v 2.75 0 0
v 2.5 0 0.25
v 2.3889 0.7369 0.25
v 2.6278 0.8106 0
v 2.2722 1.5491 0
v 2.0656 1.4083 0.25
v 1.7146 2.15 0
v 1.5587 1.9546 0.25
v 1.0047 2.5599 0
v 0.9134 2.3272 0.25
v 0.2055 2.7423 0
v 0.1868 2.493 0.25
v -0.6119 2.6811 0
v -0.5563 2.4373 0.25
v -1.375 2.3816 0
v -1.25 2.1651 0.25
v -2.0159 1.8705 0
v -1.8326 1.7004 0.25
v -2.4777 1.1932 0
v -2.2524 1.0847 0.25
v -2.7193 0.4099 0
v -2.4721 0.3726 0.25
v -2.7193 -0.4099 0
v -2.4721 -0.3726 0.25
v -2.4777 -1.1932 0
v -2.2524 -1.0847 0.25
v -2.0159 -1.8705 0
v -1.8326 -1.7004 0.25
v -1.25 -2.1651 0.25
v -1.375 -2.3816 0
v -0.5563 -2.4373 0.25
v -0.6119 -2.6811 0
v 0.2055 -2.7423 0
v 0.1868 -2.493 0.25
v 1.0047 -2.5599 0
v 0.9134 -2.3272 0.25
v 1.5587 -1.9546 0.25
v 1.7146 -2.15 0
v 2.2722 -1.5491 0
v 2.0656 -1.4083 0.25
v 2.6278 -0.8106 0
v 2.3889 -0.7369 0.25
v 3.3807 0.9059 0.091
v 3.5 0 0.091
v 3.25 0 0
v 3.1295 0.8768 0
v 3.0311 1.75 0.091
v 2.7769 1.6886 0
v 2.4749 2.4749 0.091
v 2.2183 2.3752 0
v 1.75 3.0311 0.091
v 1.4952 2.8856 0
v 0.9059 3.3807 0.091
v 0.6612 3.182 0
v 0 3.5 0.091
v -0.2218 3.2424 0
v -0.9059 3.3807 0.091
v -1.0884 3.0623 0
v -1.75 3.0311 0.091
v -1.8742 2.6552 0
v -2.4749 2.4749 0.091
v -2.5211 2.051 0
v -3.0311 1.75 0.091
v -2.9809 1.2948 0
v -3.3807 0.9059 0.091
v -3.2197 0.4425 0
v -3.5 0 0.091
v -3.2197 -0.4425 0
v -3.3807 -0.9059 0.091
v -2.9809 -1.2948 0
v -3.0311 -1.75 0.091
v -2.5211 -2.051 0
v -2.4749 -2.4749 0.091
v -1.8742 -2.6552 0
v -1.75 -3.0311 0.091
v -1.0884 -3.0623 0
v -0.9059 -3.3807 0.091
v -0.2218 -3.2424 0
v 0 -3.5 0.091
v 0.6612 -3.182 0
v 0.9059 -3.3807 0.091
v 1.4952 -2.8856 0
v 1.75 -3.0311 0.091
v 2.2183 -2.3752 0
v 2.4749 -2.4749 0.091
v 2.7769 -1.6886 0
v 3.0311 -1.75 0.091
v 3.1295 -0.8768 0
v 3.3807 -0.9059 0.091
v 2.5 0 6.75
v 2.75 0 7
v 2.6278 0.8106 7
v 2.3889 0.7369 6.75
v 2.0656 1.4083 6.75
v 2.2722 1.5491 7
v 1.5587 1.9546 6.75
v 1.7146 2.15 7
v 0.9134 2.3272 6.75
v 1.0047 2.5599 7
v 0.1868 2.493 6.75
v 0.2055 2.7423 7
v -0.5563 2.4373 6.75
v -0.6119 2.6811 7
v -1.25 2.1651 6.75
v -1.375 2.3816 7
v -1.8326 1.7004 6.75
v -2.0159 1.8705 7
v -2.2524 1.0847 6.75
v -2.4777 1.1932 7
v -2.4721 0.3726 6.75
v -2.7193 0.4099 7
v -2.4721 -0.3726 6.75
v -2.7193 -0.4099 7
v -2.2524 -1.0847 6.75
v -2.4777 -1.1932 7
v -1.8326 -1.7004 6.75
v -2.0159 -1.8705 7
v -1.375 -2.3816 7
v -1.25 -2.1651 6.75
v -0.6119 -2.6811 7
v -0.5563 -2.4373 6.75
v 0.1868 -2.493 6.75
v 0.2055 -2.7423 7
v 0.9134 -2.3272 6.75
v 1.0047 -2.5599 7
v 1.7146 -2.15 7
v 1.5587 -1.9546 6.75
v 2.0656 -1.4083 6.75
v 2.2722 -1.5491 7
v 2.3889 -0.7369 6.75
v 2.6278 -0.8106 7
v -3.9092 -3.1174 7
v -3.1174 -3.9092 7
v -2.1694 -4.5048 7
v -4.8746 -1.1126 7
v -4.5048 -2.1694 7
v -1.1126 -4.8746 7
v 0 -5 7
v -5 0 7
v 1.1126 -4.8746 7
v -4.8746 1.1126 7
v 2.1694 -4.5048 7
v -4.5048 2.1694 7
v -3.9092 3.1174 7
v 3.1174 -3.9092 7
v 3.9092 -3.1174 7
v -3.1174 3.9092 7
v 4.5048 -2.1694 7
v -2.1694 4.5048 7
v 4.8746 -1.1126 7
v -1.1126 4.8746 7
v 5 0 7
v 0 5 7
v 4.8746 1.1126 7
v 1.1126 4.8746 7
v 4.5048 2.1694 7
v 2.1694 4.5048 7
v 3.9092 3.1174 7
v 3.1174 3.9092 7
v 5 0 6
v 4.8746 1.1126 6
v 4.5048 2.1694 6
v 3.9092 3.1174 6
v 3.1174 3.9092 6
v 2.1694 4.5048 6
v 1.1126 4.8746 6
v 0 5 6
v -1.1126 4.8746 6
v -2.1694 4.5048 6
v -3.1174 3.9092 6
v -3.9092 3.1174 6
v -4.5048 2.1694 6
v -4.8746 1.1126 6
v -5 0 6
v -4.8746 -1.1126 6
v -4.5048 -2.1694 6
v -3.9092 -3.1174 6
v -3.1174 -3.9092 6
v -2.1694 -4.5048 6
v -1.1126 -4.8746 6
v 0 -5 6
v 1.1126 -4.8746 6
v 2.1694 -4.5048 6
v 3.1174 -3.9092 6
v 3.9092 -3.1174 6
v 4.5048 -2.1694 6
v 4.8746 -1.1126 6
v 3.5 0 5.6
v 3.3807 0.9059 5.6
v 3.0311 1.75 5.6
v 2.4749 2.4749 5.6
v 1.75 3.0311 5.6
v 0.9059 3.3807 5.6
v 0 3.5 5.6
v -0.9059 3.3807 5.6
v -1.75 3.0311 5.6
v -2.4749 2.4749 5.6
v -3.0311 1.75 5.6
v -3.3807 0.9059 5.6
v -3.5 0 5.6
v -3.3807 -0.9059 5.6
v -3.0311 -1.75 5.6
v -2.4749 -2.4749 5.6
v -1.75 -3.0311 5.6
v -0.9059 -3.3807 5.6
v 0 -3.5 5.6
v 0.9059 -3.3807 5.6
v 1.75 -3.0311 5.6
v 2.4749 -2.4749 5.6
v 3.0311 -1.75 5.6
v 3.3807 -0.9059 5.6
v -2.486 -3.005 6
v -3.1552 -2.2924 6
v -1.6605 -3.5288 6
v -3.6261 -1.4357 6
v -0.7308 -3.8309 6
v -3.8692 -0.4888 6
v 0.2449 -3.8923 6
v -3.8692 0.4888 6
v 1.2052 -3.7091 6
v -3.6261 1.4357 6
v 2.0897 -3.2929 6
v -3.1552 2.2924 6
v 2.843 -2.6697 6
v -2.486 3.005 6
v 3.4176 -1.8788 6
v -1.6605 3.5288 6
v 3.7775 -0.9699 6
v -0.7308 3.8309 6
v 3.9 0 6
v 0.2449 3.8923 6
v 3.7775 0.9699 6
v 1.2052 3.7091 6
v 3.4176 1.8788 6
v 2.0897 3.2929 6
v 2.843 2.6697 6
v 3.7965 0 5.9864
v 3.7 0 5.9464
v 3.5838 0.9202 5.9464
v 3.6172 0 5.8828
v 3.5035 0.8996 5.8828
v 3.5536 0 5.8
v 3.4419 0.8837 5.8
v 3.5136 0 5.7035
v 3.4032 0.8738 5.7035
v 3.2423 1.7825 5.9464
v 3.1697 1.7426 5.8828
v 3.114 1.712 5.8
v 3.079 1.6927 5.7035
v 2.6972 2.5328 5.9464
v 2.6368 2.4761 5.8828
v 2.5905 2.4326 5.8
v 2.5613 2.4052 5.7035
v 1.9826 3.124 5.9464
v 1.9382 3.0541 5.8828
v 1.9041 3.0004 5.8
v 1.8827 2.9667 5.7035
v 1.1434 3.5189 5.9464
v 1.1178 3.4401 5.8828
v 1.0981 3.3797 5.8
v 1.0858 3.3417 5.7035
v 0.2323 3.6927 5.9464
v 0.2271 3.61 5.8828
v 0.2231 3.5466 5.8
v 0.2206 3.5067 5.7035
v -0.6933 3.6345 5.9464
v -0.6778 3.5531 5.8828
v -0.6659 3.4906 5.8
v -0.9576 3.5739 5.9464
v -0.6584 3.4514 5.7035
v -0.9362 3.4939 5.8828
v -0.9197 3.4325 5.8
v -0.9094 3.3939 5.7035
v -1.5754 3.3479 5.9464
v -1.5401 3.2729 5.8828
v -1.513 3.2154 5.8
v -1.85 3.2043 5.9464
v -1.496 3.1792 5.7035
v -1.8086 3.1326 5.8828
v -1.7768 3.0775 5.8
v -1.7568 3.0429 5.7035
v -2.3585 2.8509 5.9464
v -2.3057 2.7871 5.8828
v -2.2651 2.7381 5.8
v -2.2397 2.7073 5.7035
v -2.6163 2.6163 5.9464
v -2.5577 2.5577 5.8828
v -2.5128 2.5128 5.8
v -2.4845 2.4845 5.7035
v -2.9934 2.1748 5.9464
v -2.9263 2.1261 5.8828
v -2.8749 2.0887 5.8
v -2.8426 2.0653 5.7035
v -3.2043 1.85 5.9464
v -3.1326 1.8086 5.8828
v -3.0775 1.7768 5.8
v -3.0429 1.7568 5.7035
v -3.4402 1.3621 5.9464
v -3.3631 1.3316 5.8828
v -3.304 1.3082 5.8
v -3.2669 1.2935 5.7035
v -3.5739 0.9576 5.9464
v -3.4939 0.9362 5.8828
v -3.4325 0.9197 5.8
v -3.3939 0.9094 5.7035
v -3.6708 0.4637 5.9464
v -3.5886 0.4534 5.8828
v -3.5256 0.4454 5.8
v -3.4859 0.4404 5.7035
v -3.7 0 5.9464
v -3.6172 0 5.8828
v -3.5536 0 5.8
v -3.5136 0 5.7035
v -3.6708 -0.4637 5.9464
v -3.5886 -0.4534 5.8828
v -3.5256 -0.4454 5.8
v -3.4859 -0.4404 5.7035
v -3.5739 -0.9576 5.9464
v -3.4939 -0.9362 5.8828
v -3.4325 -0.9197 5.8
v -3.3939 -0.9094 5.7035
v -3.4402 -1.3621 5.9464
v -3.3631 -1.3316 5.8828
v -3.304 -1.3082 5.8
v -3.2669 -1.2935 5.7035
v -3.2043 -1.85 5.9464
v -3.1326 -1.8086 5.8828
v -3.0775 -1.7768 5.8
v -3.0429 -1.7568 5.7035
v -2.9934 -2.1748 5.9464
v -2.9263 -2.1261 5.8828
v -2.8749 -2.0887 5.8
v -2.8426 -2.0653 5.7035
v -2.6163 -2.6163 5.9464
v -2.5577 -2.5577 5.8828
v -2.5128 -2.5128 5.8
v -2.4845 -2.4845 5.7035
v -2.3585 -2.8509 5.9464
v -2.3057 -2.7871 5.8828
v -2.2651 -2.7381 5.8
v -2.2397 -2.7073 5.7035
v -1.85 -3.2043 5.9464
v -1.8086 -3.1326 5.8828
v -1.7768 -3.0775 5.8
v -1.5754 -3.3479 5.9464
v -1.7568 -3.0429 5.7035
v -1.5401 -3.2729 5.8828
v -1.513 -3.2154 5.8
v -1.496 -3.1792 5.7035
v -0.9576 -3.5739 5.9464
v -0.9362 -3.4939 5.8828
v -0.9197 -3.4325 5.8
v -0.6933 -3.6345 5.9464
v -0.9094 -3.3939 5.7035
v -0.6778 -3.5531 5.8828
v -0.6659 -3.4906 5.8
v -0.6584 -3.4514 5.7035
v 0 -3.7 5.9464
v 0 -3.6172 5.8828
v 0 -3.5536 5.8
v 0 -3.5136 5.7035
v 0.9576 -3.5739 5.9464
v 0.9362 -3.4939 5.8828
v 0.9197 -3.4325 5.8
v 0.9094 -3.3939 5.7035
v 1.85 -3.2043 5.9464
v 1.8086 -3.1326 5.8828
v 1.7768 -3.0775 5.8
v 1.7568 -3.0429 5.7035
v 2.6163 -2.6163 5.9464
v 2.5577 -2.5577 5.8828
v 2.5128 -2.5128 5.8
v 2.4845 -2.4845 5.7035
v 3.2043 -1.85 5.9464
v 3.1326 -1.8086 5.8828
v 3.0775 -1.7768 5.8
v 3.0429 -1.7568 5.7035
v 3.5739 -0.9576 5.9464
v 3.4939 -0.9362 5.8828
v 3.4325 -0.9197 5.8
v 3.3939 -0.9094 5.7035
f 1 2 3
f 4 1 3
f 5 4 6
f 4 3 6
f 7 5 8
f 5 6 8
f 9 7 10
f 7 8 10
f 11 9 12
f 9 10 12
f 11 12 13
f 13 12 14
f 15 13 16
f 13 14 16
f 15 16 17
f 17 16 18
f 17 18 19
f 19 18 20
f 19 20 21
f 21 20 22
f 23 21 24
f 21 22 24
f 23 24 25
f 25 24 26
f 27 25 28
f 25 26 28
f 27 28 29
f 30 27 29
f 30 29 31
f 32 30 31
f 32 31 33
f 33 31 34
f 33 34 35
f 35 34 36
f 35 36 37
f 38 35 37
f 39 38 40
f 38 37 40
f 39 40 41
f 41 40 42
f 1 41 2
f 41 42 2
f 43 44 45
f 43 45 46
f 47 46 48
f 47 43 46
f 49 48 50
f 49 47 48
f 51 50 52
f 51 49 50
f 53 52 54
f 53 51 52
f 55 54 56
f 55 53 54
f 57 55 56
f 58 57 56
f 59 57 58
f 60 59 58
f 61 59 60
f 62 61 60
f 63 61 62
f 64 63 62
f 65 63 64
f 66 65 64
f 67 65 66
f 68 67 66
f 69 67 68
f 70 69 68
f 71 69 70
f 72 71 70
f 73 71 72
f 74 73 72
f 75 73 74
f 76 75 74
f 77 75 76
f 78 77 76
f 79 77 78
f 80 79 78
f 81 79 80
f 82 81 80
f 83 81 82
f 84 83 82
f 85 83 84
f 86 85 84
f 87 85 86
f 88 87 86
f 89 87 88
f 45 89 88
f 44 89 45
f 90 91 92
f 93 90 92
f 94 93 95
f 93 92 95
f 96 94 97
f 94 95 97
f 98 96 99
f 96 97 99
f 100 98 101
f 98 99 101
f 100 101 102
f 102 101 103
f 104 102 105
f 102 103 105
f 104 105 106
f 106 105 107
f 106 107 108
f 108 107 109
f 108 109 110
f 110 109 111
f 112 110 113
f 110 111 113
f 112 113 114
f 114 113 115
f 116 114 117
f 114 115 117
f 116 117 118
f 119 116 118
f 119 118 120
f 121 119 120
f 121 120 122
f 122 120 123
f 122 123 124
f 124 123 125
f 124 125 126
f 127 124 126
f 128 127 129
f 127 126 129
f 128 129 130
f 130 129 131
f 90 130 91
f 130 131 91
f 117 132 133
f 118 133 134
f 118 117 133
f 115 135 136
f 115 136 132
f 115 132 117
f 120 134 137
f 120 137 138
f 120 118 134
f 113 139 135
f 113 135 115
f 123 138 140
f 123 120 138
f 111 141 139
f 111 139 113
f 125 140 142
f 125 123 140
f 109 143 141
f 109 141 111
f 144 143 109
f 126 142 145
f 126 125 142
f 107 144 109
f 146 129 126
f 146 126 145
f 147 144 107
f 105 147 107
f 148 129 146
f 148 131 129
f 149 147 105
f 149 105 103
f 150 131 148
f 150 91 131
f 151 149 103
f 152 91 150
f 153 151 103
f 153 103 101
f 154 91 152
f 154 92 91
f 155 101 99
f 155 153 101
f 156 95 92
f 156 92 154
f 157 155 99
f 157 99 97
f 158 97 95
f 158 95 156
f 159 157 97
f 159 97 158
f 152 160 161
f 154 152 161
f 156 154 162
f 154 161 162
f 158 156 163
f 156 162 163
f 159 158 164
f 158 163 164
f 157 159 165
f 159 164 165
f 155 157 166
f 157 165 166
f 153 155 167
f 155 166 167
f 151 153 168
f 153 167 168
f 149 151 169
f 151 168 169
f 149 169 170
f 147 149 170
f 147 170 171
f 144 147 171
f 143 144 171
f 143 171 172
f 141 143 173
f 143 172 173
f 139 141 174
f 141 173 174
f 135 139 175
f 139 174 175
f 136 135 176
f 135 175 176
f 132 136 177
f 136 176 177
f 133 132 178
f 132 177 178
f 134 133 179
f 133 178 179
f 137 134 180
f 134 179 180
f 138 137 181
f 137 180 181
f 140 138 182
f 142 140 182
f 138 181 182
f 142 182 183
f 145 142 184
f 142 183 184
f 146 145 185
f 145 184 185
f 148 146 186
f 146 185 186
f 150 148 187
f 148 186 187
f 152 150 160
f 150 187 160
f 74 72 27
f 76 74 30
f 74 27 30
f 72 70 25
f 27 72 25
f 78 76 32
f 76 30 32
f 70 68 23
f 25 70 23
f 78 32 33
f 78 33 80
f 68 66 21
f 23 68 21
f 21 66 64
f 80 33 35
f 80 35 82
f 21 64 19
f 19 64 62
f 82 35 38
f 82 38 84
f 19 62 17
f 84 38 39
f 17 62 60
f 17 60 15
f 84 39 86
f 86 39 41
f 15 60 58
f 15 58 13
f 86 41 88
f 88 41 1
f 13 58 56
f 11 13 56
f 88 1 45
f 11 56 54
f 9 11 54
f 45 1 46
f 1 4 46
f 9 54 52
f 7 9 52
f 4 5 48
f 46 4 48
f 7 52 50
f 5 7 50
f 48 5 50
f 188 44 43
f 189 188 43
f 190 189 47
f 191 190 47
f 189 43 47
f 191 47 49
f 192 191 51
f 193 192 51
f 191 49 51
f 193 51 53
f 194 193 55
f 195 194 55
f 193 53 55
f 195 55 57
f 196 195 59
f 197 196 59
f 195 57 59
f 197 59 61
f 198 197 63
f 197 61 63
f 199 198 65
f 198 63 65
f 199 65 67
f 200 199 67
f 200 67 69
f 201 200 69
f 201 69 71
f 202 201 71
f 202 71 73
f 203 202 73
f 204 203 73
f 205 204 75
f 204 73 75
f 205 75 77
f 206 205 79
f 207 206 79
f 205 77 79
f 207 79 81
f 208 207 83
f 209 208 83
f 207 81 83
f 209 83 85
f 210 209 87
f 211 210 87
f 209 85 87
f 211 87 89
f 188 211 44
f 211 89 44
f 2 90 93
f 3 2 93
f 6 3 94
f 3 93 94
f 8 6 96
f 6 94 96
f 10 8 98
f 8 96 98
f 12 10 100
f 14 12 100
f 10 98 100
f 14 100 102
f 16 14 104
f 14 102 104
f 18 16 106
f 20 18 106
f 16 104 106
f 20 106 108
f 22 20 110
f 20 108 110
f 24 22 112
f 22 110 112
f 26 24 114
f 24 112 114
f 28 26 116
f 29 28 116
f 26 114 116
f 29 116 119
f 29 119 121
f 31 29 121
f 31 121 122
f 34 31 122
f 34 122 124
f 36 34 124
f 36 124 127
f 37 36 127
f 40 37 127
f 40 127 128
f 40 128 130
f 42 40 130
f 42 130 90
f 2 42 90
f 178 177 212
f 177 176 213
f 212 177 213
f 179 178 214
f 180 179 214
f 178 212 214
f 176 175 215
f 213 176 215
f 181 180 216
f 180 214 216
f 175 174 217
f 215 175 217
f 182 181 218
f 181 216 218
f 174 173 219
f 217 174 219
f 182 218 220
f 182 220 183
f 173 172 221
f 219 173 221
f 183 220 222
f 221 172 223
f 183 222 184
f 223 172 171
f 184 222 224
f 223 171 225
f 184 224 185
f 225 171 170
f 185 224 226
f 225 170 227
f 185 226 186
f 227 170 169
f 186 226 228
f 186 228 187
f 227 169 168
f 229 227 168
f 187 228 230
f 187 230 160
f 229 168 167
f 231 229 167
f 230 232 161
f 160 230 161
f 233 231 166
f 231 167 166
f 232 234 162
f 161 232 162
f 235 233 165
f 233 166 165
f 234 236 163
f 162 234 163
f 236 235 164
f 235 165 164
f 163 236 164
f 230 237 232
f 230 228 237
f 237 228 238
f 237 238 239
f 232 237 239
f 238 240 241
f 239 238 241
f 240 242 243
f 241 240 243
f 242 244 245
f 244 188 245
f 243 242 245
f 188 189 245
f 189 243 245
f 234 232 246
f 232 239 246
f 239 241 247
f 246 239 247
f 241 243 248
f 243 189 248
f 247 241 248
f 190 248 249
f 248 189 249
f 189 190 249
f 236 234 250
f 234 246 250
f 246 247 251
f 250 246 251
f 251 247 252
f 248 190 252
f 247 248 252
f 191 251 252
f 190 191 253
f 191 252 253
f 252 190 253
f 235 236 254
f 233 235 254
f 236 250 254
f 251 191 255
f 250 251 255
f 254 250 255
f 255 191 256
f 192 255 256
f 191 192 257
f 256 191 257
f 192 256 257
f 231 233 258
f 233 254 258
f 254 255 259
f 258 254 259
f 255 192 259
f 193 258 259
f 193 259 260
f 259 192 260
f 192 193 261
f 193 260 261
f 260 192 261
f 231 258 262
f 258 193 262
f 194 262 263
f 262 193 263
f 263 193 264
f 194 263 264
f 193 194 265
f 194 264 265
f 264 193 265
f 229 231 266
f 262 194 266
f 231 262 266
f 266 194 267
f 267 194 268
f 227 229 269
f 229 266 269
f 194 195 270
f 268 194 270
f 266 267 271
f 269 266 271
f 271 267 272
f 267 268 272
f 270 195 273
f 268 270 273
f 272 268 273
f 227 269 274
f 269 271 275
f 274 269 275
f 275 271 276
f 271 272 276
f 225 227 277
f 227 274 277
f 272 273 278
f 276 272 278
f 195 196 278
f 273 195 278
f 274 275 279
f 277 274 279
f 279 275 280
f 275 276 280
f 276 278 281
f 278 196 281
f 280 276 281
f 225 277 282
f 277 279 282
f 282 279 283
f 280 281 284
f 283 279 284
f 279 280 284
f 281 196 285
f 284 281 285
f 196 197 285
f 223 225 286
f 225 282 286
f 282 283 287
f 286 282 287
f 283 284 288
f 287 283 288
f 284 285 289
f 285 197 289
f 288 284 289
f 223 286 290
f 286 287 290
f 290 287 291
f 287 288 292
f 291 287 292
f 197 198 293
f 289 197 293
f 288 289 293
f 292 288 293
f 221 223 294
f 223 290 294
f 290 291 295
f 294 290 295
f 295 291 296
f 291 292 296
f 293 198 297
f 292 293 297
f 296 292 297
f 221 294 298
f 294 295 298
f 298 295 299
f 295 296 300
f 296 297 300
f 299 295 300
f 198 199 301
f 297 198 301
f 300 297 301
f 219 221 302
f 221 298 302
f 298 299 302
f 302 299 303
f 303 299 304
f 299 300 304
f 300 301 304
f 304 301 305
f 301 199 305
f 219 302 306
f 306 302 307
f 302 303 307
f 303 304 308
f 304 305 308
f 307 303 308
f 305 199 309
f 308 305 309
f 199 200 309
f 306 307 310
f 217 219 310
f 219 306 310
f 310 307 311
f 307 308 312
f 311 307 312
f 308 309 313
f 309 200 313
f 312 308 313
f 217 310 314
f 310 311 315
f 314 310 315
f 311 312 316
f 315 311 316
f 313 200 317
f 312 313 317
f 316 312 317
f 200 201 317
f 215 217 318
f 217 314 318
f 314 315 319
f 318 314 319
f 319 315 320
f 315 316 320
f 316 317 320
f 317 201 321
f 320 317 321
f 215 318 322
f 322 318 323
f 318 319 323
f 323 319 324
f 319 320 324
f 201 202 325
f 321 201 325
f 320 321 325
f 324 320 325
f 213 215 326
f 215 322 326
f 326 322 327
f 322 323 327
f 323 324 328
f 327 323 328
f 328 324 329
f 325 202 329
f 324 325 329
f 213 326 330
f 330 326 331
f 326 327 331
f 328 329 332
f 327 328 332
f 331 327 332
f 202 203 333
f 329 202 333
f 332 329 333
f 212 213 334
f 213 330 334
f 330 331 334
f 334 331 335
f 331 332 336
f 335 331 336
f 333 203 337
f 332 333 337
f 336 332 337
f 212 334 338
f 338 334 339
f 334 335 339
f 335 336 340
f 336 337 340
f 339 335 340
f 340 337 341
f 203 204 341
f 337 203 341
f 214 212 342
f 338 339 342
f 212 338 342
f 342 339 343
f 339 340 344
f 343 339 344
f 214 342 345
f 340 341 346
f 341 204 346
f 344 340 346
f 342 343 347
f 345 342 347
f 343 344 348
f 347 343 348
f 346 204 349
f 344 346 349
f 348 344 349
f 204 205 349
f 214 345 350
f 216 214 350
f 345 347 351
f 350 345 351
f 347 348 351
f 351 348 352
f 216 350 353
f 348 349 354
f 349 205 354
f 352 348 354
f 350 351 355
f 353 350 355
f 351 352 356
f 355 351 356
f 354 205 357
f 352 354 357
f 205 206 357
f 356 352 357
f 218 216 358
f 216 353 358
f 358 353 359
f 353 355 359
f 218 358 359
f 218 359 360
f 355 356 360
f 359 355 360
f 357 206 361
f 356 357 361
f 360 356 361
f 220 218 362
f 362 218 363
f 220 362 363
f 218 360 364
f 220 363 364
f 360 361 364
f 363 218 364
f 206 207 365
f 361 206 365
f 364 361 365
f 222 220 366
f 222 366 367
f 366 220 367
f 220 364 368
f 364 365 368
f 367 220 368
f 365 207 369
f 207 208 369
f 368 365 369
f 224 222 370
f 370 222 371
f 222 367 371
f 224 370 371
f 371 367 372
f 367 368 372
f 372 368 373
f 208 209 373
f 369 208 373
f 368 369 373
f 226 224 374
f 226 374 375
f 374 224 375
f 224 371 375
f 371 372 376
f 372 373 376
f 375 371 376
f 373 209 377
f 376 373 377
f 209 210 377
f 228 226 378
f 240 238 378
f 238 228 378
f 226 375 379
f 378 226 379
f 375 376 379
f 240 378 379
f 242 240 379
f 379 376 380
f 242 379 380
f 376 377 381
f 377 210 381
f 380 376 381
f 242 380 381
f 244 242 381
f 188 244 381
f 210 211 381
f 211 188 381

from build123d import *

# Parameters (mm, degrees)
SKETCH_4_R          = 3.5
EXTRUDE_1_DEPTH     = 6
SKETCH_5_R          = 5
EXTRUDE_2_DEPTH     = 1
SKETCH_6_R          = 2.5
CUT_EXTRUDE_1_DEPTH = 8
FILLET_1_R          = 0.4
CHAMFER_1_SIZE      = 0.25
CHAMFER_1_SIZE2     = 0.090992559
CHAMFER_2_SIZE      = 0.25
CHAMFER_3_SIZE      = 0.25


with BuildPart() as part:
    # Эскиз4 → Бобышка-Вытянуть1 (new body)
    with BuildSketch(Plane.XY):
        Circle(SKETCH_4_R)
    extrude(amount=EXTRUDE_1_DEPTH)

    # Эскиз5 → Бобышка-Вытянуть2 (add)
    with BuildSketch(Plane.XY.offset(6)):
        Circle(SKETCH_5_R)
    extrude(amount=EXTRUDE_2_DEPTH)

    # Эскиз6 → Вырез-Вытянуть1 (cut, through all)
    with BuildSketch(Plane.XY.offset(7)):
        Circle(SKETCH_6_R)
    extrude(amount=-CUT_EXTRUDE_1_DEPTH, mode=Mode.SUBTRACT)

    # Скругление1
    fillet_1_edges = [part.edges().sort_by_distance(p)[0] for p in [
        (-3.5, 0, 6),
    ]]
    fillet(fillet_1_edges, radius=FILLET_1_R)

    # Фаска1
    chamfer_1_edges = [part.edges().sort_by_distance(p)[0] for p in [
        (-3.5, 0, 0),
    ]]
    chamfer_1_side = [part.faces().sort_by_distance(p)[0] for p in [
        (-3.401005051, 0, 0),
    ]]
    chamfer(chamfer_1_edges, length=CHAMFER_1_SIZE, length2=CHAMFER_1_SIZE2, reference=chamfer_1_side[0])

    # Фаска2
    chamfer_2_edges = [part.edges().sort_by_distance(p)[0] for p in [
        (-2.5, 0, 0),
    ]]
    chamfer(chamfer_2_edges, length=CHAMFER_2_SIZE)

    # Фаска3
    chamfer_3_edges = [part.edges().sort_by_distance(p)[0] for p in [
        (-2.5, 0, 7),
    ]]
    chamfer(chamfer_3_edges, length=CHAMFER_3_SIZE)


solid = part.part
